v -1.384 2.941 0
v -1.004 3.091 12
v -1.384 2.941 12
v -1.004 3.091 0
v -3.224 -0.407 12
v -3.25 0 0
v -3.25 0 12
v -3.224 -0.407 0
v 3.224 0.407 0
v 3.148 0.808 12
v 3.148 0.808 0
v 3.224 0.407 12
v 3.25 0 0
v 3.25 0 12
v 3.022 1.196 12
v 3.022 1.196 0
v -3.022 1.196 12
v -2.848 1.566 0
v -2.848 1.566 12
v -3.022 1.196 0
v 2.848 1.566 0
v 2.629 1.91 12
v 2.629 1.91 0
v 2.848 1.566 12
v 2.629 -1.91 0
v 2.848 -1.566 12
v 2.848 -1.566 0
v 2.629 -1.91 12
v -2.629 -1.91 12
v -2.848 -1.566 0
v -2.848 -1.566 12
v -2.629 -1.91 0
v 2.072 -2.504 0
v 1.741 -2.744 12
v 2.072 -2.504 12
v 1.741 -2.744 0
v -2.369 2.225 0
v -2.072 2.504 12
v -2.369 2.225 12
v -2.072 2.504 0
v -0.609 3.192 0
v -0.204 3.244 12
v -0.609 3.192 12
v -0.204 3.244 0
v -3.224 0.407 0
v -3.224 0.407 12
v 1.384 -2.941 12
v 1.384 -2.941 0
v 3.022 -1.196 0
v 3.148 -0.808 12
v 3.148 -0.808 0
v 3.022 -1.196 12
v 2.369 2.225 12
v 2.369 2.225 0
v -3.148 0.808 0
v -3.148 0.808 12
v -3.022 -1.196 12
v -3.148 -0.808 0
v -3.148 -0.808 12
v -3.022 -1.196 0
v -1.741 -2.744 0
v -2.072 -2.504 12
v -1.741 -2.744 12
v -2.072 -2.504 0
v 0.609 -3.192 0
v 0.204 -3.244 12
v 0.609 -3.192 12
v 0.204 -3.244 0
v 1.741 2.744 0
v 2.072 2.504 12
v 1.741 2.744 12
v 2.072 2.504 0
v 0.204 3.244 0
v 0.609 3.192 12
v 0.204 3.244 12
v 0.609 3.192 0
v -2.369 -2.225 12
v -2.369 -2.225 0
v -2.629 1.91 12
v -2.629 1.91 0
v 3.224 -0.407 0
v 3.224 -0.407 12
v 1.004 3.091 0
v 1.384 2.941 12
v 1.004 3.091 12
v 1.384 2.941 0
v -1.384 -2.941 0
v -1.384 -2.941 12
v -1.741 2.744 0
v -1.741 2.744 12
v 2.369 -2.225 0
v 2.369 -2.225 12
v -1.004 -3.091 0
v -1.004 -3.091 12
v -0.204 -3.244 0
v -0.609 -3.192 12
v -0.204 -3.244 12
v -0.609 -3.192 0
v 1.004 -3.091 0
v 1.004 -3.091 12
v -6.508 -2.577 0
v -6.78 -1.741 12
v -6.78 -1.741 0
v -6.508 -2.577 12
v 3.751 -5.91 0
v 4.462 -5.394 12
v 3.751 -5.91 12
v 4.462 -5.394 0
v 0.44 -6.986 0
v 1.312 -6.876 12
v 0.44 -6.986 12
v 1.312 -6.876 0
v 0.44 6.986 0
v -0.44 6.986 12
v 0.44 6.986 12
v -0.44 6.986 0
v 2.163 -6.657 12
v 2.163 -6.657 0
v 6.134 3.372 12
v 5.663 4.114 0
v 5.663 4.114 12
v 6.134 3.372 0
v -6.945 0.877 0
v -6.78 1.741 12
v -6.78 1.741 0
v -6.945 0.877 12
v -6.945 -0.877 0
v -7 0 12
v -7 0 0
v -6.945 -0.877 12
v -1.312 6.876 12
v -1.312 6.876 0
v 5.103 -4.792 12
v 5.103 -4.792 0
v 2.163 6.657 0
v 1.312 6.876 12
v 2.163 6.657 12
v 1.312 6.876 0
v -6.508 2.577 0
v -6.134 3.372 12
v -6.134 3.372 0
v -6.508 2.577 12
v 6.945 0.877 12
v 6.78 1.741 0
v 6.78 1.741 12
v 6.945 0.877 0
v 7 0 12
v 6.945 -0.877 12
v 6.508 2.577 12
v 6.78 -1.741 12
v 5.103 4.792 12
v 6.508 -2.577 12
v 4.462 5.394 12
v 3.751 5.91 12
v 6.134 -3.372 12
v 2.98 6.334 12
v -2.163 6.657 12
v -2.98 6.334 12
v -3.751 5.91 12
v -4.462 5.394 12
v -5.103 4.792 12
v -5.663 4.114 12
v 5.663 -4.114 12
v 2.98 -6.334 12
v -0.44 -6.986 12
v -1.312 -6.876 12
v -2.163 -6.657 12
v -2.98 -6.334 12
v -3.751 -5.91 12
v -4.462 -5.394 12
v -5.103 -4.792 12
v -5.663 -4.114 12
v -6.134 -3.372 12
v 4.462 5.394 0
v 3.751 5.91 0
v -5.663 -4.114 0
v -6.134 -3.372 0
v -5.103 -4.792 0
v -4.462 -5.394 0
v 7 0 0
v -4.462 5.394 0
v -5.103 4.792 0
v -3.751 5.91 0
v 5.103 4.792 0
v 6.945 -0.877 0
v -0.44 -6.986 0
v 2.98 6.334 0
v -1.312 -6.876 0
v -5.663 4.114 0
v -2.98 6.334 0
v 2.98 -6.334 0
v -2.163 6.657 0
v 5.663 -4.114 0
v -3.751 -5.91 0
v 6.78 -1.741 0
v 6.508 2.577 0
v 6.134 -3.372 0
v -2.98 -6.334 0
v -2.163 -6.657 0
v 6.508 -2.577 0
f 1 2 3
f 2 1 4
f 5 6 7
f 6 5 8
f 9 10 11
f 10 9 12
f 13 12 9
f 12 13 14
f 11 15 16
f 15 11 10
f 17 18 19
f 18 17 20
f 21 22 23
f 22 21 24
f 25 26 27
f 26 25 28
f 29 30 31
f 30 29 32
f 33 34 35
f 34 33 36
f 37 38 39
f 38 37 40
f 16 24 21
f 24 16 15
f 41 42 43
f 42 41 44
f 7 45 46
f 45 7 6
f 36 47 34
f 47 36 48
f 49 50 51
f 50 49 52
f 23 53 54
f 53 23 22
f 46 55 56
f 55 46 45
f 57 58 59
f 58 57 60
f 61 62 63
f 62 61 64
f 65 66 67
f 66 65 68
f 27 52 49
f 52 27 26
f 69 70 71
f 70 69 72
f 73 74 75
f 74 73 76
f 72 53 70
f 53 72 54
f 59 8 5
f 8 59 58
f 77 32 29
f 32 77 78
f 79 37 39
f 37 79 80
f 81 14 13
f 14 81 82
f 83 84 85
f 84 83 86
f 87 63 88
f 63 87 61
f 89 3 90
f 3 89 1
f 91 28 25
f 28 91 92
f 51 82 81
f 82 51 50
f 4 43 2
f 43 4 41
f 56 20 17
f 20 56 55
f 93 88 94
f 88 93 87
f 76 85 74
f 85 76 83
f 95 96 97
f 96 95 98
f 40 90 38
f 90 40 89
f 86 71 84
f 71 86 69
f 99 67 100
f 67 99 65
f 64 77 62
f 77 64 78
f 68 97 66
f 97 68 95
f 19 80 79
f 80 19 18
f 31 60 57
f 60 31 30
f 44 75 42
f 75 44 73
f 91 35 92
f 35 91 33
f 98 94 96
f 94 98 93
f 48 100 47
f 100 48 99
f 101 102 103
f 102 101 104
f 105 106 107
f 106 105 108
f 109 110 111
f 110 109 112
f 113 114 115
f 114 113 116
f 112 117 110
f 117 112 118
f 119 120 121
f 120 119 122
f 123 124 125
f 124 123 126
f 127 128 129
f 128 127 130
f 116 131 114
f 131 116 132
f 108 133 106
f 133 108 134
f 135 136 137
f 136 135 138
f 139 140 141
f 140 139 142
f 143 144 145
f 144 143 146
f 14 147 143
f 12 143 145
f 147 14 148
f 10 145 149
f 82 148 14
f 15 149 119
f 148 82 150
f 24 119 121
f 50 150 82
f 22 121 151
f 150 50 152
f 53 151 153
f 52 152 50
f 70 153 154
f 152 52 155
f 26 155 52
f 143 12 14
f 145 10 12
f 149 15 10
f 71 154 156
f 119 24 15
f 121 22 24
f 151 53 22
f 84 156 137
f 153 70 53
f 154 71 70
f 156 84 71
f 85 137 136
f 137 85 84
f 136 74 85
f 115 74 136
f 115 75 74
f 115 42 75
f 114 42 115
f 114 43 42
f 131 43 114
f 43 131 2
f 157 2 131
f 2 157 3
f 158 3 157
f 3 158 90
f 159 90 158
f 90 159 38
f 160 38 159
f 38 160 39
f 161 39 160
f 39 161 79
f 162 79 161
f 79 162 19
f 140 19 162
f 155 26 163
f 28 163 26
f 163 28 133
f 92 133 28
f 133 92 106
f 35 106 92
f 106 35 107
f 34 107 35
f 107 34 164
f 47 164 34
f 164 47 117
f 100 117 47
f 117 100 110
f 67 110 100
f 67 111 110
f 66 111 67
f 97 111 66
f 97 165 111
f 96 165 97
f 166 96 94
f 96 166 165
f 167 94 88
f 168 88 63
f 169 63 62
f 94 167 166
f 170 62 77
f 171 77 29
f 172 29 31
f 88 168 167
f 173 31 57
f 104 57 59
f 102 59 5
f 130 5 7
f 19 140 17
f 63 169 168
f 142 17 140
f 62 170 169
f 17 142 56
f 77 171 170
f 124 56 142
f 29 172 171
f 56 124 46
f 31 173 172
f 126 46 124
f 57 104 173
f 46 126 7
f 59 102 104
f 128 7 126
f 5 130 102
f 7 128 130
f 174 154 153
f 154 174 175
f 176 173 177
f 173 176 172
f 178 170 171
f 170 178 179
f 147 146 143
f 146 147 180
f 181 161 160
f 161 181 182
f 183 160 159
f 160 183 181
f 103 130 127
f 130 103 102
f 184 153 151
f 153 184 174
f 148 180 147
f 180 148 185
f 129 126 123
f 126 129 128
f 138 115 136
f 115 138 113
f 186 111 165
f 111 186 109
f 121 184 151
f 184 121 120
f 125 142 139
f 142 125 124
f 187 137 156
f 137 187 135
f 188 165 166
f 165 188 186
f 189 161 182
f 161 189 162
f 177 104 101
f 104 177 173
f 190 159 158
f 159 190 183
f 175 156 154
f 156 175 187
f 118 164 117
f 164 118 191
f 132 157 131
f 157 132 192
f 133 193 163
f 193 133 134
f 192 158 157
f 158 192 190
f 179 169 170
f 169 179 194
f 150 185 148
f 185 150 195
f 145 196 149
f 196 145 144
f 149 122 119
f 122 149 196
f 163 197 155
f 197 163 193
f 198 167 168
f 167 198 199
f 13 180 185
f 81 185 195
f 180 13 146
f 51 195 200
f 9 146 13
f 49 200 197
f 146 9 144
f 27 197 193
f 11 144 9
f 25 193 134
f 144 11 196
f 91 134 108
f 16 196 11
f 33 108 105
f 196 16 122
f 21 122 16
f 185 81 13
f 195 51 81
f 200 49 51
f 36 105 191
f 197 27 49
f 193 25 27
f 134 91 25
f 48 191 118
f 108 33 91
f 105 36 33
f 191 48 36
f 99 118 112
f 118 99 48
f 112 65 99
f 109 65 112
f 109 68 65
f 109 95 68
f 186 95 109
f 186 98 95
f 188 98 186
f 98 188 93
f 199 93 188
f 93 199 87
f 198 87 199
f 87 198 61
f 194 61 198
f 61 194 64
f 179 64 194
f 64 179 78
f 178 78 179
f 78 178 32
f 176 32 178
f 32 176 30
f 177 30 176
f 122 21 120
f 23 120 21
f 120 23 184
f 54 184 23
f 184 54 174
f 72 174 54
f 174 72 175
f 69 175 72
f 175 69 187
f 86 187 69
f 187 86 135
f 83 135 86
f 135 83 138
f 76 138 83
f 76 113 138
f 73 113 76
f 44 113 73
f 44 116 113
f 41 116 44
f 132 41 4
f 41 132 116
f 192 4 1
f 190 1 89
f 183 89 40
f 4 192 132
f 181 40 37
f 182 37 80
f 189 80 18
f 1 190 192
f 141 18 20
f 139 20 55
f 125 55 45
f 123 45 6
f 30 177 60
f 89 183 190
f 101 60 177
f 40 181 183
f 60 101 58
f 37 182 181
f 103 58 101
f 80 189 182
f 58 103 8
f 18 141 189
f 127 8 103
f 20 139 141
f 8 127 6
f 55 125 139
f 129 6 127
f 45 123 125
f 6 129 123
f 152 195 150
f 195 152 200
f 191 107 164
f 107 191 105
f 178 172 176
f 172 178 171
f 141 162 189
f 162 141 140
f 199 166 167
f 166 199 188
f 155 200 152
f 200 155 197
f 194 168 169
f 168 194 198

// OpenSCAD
$fn = 50;


difference() {
	union() {
		*color(alpha = 1.0000000000, c = "gray") {
			translate(v = [0, 7, 0]) {
				linear_extrude(height = 1) {
					text(font = "Arial:style=Bold", halign = "center", size = 4.5000000000, text = "COMMENT plate main", valign = "center");
				}
			}
		}
		*color(alpha = 1.0000000000, c = "gray") {
			translate(v = [0, 14, 0]) {
				linear_extrude(height = 1) {
					text(font = "Arial:style=Bold", halign = "center", size = 4.5000000000, text = "COMMENT description oobb_plate_shape_p_type_12_depth_1_width_1_height_12_thickness_true_both_holes", valign = "center");
				}
			}
		}
		cylinder(h = 12, r = 7.0000000000);
	}
	union() {
		*color(alpha = 1.0000000000, c = "gray") {
			translate(v = [0, 7, 0]) {
				linear_extrude(height = 1) {
					text(font = "Arial:style=Bold", halign = "center", size = 4.5000000000, text = "COMMENT holes main", valign = "center");
				}
			}
		}
		*color(alpha = 1.0000000000, c = "gray") {
			translate(v = [0, 14, 0]) {
				linear_extrude(height = 1) {
					text(font = "Arial:style=Bold", halign = "center", size = 4.5000000000, text = "COMMENT description oobb_holes_shape_n_type_1_width_1_height_12_thickness_true_both_holes", valign = "center");
				}
			}
		}
		translate(v = [0, 0, -50]) {
			cylinder(h = 100, r = 3.2500000000);
		}
		translate(v = [0, 0, -50]) {
			cylinder(h = 100, r = 1.8000000000);
		}
	}
}
